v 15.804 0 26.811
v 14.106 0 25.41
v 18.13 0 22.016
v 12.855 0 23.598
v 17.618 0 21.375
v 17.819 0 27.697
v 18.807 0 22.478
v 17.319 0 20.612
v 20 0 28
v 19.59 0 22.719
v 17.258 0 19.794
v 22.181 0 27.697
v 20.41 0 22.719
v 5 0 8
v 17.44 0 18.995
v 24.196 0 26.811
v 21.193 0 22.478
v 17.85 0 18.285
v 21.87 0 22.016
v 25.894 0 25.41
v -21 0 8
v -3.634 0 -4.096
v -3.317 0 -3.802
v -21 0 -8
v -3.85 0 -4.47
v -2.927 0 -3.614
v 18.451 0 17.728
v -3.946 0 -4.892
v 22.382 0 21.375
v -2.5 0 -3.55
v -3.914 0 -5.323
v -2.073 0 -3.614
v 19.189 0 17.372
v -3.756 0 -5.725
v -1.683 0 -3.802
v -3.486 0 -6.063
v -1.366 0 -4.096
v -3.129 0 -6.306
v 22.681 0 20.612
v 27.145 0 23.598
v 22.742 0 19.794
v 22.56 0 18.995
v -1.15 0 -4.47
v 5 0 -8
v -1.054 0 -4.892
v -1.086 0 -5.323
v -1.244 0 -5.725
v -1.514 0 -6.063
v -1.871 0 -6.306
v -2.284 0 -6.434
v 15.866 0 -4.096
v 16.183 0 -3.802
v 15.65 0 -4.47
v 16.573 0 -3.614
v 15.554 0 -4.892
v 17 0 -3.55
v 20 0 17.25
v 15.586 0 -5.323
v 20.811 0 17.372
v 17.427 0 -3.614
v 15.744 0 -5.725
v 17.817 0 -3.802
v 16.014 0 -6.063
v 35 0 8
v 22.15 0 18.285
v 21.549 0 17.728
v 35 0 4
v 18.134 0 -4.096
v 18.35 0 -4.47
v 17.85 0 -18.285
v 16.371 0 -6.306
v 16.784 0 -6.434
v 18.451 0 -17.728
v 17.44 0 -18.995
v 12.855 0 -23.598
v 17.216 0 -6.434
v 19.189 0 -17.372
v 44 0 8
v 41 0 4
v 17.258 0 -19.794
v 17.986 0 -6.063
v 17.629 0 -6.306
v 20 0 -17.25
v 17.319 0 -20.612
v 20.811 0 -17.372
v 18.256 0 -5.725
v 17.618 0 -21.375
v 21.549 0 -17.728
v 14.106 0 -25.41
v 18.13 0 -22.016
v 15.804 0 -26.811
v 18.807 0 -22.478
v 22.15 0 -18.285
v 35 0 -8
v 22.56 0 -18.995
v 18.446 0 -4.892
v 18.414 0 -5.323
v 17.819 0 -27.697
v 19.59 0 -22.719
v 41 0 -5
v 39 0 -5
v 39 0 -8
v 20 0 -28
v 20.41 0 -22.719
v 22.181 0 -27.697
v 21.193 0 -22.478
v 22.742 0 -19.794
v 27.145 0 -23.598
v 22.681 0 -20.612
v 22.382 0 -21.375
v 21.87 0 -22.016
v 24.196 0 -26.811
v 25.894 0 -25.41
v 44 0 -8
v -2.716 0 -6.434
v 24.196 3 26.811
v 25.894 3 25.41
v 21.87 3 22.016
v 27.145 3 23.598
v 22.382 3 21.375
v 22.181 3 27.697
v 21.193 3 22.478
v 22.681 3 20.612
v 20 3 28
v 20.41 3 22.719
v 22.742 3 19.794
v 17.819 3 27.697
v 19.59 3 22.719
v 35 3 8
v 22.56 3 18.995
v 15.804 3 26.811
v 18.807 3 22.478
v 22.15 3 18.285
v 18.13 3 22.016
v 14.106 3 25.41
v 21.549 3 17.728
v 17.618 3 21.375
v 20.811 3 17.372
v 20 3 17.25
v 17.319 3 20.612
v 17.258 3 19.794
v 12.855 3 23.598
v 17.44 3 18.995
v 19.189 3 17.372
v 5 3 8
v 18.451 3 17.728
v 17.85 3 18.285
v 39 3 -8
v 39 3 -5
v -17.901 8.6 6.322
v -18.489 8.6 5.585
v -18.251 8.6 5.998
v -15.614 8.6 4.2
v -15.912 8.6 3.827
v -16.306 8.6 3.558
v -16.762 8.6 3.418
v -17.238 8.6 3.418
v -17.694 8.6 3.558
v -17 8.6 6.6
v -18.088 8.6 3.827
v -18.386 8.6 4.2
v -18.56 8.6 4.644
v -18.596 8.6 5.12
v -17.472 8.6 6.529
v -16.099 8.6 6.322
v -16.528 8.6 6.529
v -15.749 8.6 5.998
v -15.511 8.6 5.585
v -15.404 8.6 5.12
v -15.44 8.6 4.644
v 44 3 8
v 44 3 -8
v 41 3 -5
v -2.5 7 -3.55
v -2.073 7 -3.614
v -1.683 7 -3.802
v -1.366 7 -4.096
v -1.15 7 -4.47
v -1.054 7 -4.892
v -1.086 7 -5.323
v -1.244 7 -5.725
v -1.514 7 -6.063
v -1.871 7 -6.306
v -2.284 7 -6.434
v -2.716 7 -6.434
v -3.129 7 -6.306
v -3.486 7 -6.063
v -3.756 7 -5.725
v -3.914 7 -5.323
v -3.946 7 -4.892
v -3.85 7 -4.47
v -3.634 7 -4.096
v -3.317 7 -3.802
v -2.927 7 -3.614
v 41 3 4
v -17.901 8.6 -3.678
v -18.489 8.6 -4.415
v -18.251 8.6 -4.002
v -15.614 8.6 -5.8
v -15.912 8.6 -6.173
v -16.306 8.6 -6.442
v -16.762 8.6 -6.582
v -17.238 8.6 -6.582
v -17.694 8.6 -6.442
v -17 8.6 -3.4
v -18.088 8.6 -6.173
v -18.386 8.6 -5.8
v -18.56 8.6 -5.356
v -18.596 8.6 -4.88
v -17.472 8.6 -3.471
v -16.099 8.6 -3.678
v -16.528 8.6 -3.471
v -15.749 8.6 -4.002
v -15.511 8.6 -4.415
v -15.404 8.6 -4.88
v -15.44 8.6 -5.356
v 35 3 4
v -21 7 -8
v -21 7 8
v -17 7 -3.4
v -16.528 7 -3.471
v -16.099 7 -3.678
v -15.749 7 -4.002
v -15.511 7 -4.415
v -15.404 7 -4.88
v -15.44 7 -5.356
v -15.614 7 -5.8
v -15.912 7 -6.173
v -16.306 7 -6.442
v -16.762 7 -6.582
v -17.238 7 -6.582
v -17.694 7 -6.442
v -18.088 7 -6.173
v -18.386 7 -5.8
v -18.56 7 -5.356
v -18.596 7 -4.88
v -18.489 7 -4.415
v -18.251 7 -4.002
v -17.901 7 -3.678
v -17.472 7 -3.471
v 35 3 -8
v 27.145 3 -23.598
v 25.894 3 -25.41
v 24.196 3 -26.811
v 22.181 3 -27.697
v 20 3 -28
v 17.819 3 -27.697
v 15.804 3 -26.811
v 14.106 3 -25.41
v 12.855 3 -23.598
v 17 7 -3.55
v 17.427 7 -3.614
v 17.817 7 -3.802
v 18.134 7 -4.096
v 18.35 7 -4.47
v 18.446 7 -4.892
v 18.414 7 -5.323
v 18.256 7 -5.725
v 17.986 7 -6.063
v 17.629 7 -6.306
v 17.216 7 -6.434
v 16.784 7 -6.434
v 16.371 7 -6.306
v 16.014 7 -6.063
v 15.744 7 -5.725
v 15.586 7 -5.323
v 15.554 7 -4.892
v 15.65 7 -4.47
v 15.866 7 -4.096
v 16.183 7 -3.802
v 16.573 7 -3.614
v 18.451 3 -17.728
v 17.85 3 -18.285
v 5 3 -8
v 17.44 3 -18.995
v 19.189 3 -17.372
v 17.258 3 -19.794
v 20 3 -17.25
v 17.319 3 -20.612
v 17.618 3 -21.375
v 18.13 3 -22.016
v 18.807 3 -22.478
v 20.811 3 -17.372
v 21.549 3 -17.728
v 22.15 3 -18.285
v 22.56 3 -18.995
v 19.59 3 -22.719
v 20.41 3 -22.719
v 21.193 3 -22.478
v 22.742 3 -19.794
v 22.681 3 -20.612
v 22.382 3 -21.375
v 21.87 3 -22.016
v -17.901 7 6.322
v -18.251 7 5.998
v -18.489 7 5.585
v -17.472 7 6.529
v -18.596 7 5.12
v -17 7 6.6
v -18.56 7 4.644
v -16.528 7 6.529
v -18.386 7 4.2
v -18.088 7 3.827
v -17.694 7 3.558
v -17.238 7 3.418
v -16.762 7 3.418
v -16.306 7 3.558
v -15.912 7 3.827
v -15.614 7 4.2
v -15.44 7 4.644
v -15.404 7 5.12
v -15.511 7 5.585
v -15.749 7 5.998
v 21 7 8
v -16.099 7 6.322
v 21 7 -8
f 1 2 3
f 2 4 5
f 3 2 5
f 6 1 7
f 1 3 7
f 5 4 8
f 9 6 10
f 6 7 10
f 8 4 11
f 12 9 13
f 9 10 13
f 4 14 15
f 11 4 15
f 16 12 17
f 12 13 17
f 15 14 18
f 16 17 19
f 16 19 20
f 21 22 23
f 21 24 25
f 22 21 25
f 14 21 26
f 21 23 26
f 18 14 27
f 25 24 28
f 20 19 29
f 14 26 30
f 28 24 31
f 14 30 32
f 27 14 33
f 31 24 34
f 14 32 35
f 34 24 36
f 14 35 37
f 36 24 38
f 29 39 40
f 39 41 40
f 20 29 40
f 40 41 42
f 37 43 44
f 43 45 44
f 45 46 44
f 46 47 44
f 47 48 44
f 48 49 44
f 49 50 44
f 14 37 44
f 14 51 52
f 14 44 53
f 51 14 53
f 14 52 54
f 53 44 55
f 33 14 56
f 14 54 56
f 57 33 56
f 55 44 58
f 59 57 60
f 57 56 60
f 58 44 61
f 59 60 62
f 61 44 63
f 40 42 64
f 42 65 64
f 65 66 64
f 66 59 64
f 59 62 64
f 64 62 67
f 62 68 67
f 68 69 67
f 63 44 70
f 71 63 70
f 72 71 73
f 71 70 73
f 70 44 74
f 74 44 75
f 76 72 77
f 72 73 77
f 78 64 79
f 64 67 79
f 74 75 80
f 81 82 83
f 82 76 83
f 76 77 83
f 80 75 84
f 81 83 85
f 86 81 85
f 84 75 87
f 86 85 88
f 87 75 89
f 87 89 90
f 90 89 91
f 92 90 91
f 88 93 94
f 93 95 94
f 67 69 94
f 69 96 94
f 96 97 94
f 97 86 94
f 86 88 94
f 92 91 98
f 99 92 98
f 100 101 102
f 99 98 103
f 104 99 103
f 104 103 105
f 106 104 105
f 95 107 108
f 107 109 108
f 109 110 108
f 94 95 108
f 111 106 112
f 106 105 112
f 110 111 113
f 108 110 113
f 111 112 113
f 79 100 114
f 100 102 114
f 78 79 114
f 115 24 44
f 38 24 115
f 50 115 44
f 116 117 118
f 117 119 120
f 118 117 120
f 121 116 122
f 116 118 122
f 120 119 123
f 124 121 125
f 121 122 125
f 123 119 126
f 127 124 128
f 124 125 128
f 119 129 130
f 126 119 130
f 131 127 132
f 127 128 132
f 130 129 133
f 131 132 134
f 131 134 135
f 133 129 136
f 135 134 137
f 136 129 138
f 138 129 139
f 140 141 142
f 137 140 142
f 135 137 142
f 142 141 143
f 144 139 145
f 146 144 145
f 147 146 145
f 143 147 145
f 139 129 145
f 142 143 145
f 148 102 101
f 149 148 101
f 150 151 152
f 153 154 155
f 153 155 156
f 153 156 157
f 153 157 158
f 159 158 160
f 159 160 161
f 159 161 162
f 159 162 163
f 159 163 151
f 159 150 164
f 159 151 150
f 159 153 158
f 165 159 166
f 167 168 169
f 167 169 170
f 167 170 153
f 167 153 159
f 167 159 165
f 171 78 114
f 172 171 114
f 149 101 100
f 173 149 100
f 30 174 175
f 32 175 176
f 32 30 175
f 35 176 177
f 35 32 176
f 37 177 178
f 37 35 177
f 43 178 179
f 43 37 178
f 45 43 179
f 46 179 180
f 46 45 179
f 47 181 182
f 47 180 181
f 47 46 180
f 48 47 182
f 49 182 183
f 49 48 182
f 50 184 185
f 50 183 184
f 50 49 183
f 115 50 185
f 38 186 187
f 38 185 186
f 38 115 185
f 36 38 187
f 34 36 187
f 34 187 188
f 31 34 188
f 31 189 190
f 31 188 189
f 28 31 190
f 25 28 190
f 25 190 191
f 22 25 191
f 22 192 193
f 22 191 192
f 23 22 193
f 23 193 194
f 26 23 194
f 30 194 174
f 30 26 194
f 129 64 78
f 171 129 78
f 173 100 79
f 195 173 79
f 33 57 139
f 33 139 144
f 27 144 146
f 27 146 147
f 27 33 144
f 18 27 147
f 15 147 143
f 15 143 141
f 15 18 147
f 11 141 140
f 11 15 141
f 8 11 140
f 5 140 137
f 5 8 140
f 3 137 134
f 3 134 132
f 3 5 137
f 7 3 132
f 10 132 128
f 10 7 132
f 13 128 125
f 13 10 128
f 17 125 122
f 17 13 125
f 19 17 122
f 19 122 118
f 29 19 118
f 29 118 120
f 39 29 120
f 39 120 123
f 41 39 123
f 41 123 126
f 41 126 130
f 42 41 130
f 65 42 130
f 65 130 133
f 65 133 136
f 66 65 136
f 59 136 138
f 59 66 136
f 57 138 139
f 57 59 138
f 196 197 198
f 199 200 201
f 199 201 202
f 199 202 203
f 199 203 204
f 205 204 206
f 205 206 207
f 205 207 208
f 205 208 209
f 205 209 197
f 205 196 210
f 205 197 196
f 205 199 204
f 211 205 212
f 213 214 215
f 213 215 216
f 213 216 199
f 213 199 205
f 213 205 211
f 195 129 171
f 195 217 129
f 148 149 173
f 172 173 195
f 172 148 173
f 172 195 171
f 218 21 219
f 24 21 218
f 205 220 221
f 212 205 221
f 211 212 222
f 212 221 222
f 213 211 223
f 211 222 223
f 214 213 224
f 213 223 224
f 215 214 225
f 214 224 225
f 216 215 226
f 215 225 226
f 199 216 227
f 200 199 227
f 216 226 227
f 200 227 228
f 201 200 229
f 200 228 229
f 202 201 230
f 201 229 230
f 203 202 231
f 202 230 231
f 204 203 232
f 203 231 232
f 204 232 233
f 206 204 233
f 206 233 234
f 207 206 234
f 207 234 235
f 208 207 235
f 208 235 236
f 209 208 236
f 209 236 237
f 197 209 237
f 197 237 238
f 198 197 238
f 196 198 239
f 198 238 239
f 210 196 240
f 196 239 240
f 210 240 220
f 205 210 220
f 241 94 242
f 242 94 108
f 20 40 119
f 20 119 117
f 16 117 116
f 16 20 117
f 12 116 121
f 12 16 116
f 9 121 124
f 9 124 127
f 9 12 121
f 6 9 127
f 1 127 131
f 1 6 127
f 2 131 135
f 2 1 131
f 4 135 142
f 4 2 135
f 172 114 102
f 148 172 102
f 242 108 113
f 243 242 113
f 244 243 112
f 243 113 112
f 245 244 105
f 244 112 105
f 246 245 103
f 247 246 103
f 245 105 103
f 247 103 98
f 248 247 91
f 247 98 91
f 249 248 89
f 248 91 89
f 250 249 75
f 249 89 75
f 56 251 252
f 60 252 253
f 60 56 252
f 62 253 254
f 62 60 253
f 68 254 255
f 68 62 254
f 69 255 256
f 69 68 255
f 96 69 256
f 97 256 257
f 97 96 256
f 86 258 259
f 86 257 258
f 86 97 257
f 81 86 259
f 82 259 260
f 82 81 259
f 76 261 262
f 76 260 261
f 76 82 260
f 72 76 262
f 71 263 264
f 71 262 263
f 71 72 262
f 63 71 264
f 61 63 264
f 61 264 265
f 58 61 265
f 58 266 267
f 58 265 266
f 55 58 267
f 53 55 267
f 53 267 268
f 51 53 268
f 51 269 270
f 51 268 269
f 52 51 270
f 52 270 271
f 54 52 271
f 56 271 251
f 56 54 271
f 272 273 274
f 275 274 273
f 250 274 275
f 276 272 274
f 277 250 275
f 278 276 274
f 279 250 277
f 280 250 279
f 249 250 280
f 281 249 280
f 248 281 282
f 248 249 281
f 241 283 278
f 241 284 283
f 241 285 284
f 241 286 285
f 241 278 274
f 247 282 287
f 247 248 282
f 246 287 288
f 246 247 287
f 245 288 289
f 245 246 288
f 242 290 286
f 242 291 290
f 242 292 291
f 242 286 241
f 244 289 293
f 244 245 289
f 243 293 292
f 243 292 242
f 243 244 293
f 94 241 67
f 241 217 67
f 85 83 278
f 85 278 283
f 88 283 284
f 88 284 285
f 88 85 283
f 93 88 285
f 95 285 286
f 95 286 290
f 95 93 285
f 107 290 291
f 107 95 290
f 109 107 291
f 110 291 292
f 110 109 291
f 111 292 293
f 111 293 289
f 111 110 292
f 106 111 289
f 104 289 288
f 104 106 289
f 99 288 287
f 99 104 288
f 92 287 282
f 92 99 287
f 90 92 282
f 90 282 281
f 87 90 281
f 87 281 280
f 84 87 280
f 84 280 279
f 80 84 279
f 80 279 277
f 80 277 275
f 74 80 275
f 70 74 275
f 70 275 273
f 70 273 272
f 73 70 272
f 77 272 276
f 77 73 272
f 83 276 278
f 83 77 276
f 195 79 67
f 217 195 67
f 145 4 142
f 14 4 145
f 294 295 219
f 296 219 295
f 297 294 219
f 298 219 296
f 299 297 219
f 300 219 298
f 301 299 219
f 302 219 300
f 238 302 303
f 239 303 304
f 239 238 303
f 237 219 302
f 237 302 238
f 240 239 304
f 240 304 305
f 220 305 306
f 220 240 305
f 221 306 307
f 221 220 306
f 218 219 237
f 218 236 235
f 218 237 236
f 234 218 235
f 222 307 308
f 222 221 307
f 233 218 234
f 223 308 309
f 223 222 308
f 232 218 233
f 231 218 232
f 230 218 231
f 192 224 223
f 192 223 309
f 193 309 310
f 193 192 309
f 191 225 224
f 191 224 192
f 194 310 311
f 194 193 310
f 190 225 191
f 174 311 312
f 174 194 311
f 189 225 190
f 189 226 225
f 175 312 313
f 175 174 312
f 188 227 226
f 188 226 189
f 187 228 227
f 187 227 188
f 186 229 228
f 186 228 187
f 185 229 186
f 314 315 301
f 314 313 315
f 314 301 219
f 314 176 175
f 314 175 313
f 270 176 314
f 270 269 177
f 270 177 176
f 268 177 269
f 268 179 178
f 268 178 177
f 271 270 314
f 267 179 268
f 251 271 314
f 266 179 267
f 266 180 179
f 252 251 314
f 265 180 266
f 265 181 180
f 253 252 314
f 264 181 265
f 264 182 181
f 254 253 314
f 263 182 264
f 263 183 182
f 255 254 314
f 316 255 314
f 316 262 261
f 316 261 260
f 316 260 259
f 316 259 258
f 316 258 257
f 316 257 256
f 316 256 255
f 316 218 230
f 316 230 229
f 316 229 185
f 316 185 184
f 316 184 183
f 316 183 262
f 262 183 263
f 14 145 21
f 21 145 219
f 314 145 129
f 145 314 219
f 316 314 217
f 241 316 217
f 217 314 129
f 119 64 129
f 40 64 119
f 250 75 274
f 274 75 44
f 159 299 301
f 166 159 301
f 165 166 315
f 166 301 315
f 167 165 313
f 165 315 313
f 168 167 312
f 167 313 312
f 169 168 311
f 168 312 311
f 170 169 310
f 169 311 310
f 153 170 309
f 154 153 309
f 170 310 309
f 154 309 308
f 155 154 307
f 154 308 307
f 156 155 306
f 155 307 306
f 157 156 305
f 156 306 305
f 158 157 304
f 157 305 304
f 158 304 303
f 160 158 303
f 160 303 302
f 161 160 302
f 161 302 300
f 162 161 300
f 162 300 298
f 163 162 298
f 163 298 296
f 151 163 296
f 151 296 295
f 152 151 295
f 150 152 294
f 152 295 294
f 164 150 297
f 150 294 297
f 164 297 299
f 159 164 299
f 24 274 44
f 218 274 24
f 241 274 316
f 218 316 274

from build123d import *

# Parameters (mm, degrees)
SKETCH1_W           = 42
SKETCH1_H           = 16
BOSS_EXTRUDE1_DEPTH = 7
SKETCH2_R           = 1.6
BOSS_EXTRUDE2_DEPTH = 1.6
CUT_EXTRUDE1_REACH  = 26.062
SKETCH3_R           = 1.45
SKETCH4_R           = 2.75
BOSS_EXTRUDE3_DEPTH = 3
BOSS_EXTRUDE4_DEPTH = 8
BOSS_EXTRUDE5_DEPTH = 3


with BuildPart() as part:
    # Sketch1 → Boss-Extrude1 (new body)
    with BuildSketch(Plane(origin=(0, 0, 0), x_dir=(1, 0, 0), z_dir=(0, 1, 0))):
        Rectangle(SKETCH1_W, SKETCH1_H)
    extrude(amount=BOSS_EXTRUDE1_DEPTH)

    # Sketch2 → Boss-Extrude2 (add)
    with BuildSketch(Plane(origin=(0, 7, 0), x_dir=(1, 0, 0), z_dir=(0, 1, 0))):
        with Locations(Location((-17, 5, 0), (0, 0, 270))):
            Circle(SKETCH2_R)
        with Locations(Location((-17, -5, 0), (0, 0, 270))):
            Circle(SKETCH2_R)
    extrude(amount=BOSS_EXTRUDE2_DEPTH)

    # Sketch3 → Cut-Extrude1 (cut, up to next)
    with BuildSketch(Plane(origin=(0, 0, 0), x_dir=(1, 0, 0), z_dir=(0, 1, 0)), mode=Mode.PRIVATE) as cut_extrude1_sk1:
        with Locations(Location((-2.5, 5, 0), (0, 0, 270))):
            Circle(SKETCH3_R)
    cut_extrude1_tool1 = extrude(cut_extrude1_sk1.sketch, amount=CUT_EXTRUDE1_REACH, mode=Mode.PRIVATE) & part.part
    # Sketch3 → Cut-Extrude1 (cut, up to next)
    with BuildSketch(Plane(origin=(0, 0, 0), x_dir=(1, 0, 0), z_dir=(0, 1, 0)), mode=Mode.PRIVATE) as cut_extrude1_sk2:
        with Locations(Location((17, 5, 0), (0, 0, 270))):
            Circle(SKETCH3_R)
    cut_extrude1_tool2 = extrude(cut_extrude1_sk2.sketch, amount=CUT_EXTRUDE1_REACH, mode=Mode.PRIVATE) & part.part
    add(cut_extrude1_tool1.solids().sort_by_distance((-2.5, 0, -5))[0], mode=Mode.SUBTRACT)
    add(cut_extrude1_tool2.solids().sort_by_distance((17, 0, -5))[0], mode=Mode.SUBTRACT)

    # Sketch4 → Boss-Extrude3 (add)
    # profile 1 of 2: a face of its own
    with BuildSketch(Plane(origin=(0, 0, 0), x_dir=(1, 0, 0), z_dir=(0, 1, 0))):
        with BuildLine():
            Line((12.854829477, 23.59812982), (5, 8))
            Line((5, 8), (35, 8))
            Line((35, 8), (27.145170523, 23.59812982))
            ThreePointArc((27.145170523, 23.59812982), (20, 28), (12.854829477, 23.59812982))
        make_face()
        with Locations(Location((20, 20, 0), (0, 0, 270))):
            Circle(SKETCH4_R, mode=Mode.SUBTRACT)
    # profile 2 of 2: a face of its own
    with BuildSketch(Plane(origin=(0, 0, 0), x_dir=(1, 0, 0), z_dir=(0, 1, 0))):
        with BuildLine():
            Line((35, -8), (27.145170523, -23.59812982))
            ThreePointArc((27.145170523, -23.59812982), (20, -28), (12.854829477, -23.59812982))
            Line((12.854829477, -23.59812982), (5, -8))
            Line((5, -8), (35, -8))
        make_face()
        with Locations(Location((20, -20, 0), (0, 0, 90))):
            Circle(SKETCH4_R, mode=Mode.SUBTRACT)
    extrude(amount=BOSS_EXTRUDE3_DEPTH)

    # Sketch5 → Boss-Extrude4 (add, symmetric)
    with BuildSketch(Plane.XY):
        Polygon((21, 7), (35, 3), (35, 0), (21, 0), align=None)
    extrude(amount=BOSS_EXTRUDE4_DEPTH, both=True)

    # Sketch6 → Boss-Extrude5 (add)
    with BuildSketch(Plane(origin=(0, 0, 0), x_dir=(1, 0, 0), z_dir=(0, 1, 0))):
        Polygon((35, -8), (44, -8), (44, 8), (39, 8), (39, 5), (41, 5), (41, -4), (35, -4), align=None)
    extrude(amount=BOSS_EXTRUDE5_DEPTH)


solid = part.part
